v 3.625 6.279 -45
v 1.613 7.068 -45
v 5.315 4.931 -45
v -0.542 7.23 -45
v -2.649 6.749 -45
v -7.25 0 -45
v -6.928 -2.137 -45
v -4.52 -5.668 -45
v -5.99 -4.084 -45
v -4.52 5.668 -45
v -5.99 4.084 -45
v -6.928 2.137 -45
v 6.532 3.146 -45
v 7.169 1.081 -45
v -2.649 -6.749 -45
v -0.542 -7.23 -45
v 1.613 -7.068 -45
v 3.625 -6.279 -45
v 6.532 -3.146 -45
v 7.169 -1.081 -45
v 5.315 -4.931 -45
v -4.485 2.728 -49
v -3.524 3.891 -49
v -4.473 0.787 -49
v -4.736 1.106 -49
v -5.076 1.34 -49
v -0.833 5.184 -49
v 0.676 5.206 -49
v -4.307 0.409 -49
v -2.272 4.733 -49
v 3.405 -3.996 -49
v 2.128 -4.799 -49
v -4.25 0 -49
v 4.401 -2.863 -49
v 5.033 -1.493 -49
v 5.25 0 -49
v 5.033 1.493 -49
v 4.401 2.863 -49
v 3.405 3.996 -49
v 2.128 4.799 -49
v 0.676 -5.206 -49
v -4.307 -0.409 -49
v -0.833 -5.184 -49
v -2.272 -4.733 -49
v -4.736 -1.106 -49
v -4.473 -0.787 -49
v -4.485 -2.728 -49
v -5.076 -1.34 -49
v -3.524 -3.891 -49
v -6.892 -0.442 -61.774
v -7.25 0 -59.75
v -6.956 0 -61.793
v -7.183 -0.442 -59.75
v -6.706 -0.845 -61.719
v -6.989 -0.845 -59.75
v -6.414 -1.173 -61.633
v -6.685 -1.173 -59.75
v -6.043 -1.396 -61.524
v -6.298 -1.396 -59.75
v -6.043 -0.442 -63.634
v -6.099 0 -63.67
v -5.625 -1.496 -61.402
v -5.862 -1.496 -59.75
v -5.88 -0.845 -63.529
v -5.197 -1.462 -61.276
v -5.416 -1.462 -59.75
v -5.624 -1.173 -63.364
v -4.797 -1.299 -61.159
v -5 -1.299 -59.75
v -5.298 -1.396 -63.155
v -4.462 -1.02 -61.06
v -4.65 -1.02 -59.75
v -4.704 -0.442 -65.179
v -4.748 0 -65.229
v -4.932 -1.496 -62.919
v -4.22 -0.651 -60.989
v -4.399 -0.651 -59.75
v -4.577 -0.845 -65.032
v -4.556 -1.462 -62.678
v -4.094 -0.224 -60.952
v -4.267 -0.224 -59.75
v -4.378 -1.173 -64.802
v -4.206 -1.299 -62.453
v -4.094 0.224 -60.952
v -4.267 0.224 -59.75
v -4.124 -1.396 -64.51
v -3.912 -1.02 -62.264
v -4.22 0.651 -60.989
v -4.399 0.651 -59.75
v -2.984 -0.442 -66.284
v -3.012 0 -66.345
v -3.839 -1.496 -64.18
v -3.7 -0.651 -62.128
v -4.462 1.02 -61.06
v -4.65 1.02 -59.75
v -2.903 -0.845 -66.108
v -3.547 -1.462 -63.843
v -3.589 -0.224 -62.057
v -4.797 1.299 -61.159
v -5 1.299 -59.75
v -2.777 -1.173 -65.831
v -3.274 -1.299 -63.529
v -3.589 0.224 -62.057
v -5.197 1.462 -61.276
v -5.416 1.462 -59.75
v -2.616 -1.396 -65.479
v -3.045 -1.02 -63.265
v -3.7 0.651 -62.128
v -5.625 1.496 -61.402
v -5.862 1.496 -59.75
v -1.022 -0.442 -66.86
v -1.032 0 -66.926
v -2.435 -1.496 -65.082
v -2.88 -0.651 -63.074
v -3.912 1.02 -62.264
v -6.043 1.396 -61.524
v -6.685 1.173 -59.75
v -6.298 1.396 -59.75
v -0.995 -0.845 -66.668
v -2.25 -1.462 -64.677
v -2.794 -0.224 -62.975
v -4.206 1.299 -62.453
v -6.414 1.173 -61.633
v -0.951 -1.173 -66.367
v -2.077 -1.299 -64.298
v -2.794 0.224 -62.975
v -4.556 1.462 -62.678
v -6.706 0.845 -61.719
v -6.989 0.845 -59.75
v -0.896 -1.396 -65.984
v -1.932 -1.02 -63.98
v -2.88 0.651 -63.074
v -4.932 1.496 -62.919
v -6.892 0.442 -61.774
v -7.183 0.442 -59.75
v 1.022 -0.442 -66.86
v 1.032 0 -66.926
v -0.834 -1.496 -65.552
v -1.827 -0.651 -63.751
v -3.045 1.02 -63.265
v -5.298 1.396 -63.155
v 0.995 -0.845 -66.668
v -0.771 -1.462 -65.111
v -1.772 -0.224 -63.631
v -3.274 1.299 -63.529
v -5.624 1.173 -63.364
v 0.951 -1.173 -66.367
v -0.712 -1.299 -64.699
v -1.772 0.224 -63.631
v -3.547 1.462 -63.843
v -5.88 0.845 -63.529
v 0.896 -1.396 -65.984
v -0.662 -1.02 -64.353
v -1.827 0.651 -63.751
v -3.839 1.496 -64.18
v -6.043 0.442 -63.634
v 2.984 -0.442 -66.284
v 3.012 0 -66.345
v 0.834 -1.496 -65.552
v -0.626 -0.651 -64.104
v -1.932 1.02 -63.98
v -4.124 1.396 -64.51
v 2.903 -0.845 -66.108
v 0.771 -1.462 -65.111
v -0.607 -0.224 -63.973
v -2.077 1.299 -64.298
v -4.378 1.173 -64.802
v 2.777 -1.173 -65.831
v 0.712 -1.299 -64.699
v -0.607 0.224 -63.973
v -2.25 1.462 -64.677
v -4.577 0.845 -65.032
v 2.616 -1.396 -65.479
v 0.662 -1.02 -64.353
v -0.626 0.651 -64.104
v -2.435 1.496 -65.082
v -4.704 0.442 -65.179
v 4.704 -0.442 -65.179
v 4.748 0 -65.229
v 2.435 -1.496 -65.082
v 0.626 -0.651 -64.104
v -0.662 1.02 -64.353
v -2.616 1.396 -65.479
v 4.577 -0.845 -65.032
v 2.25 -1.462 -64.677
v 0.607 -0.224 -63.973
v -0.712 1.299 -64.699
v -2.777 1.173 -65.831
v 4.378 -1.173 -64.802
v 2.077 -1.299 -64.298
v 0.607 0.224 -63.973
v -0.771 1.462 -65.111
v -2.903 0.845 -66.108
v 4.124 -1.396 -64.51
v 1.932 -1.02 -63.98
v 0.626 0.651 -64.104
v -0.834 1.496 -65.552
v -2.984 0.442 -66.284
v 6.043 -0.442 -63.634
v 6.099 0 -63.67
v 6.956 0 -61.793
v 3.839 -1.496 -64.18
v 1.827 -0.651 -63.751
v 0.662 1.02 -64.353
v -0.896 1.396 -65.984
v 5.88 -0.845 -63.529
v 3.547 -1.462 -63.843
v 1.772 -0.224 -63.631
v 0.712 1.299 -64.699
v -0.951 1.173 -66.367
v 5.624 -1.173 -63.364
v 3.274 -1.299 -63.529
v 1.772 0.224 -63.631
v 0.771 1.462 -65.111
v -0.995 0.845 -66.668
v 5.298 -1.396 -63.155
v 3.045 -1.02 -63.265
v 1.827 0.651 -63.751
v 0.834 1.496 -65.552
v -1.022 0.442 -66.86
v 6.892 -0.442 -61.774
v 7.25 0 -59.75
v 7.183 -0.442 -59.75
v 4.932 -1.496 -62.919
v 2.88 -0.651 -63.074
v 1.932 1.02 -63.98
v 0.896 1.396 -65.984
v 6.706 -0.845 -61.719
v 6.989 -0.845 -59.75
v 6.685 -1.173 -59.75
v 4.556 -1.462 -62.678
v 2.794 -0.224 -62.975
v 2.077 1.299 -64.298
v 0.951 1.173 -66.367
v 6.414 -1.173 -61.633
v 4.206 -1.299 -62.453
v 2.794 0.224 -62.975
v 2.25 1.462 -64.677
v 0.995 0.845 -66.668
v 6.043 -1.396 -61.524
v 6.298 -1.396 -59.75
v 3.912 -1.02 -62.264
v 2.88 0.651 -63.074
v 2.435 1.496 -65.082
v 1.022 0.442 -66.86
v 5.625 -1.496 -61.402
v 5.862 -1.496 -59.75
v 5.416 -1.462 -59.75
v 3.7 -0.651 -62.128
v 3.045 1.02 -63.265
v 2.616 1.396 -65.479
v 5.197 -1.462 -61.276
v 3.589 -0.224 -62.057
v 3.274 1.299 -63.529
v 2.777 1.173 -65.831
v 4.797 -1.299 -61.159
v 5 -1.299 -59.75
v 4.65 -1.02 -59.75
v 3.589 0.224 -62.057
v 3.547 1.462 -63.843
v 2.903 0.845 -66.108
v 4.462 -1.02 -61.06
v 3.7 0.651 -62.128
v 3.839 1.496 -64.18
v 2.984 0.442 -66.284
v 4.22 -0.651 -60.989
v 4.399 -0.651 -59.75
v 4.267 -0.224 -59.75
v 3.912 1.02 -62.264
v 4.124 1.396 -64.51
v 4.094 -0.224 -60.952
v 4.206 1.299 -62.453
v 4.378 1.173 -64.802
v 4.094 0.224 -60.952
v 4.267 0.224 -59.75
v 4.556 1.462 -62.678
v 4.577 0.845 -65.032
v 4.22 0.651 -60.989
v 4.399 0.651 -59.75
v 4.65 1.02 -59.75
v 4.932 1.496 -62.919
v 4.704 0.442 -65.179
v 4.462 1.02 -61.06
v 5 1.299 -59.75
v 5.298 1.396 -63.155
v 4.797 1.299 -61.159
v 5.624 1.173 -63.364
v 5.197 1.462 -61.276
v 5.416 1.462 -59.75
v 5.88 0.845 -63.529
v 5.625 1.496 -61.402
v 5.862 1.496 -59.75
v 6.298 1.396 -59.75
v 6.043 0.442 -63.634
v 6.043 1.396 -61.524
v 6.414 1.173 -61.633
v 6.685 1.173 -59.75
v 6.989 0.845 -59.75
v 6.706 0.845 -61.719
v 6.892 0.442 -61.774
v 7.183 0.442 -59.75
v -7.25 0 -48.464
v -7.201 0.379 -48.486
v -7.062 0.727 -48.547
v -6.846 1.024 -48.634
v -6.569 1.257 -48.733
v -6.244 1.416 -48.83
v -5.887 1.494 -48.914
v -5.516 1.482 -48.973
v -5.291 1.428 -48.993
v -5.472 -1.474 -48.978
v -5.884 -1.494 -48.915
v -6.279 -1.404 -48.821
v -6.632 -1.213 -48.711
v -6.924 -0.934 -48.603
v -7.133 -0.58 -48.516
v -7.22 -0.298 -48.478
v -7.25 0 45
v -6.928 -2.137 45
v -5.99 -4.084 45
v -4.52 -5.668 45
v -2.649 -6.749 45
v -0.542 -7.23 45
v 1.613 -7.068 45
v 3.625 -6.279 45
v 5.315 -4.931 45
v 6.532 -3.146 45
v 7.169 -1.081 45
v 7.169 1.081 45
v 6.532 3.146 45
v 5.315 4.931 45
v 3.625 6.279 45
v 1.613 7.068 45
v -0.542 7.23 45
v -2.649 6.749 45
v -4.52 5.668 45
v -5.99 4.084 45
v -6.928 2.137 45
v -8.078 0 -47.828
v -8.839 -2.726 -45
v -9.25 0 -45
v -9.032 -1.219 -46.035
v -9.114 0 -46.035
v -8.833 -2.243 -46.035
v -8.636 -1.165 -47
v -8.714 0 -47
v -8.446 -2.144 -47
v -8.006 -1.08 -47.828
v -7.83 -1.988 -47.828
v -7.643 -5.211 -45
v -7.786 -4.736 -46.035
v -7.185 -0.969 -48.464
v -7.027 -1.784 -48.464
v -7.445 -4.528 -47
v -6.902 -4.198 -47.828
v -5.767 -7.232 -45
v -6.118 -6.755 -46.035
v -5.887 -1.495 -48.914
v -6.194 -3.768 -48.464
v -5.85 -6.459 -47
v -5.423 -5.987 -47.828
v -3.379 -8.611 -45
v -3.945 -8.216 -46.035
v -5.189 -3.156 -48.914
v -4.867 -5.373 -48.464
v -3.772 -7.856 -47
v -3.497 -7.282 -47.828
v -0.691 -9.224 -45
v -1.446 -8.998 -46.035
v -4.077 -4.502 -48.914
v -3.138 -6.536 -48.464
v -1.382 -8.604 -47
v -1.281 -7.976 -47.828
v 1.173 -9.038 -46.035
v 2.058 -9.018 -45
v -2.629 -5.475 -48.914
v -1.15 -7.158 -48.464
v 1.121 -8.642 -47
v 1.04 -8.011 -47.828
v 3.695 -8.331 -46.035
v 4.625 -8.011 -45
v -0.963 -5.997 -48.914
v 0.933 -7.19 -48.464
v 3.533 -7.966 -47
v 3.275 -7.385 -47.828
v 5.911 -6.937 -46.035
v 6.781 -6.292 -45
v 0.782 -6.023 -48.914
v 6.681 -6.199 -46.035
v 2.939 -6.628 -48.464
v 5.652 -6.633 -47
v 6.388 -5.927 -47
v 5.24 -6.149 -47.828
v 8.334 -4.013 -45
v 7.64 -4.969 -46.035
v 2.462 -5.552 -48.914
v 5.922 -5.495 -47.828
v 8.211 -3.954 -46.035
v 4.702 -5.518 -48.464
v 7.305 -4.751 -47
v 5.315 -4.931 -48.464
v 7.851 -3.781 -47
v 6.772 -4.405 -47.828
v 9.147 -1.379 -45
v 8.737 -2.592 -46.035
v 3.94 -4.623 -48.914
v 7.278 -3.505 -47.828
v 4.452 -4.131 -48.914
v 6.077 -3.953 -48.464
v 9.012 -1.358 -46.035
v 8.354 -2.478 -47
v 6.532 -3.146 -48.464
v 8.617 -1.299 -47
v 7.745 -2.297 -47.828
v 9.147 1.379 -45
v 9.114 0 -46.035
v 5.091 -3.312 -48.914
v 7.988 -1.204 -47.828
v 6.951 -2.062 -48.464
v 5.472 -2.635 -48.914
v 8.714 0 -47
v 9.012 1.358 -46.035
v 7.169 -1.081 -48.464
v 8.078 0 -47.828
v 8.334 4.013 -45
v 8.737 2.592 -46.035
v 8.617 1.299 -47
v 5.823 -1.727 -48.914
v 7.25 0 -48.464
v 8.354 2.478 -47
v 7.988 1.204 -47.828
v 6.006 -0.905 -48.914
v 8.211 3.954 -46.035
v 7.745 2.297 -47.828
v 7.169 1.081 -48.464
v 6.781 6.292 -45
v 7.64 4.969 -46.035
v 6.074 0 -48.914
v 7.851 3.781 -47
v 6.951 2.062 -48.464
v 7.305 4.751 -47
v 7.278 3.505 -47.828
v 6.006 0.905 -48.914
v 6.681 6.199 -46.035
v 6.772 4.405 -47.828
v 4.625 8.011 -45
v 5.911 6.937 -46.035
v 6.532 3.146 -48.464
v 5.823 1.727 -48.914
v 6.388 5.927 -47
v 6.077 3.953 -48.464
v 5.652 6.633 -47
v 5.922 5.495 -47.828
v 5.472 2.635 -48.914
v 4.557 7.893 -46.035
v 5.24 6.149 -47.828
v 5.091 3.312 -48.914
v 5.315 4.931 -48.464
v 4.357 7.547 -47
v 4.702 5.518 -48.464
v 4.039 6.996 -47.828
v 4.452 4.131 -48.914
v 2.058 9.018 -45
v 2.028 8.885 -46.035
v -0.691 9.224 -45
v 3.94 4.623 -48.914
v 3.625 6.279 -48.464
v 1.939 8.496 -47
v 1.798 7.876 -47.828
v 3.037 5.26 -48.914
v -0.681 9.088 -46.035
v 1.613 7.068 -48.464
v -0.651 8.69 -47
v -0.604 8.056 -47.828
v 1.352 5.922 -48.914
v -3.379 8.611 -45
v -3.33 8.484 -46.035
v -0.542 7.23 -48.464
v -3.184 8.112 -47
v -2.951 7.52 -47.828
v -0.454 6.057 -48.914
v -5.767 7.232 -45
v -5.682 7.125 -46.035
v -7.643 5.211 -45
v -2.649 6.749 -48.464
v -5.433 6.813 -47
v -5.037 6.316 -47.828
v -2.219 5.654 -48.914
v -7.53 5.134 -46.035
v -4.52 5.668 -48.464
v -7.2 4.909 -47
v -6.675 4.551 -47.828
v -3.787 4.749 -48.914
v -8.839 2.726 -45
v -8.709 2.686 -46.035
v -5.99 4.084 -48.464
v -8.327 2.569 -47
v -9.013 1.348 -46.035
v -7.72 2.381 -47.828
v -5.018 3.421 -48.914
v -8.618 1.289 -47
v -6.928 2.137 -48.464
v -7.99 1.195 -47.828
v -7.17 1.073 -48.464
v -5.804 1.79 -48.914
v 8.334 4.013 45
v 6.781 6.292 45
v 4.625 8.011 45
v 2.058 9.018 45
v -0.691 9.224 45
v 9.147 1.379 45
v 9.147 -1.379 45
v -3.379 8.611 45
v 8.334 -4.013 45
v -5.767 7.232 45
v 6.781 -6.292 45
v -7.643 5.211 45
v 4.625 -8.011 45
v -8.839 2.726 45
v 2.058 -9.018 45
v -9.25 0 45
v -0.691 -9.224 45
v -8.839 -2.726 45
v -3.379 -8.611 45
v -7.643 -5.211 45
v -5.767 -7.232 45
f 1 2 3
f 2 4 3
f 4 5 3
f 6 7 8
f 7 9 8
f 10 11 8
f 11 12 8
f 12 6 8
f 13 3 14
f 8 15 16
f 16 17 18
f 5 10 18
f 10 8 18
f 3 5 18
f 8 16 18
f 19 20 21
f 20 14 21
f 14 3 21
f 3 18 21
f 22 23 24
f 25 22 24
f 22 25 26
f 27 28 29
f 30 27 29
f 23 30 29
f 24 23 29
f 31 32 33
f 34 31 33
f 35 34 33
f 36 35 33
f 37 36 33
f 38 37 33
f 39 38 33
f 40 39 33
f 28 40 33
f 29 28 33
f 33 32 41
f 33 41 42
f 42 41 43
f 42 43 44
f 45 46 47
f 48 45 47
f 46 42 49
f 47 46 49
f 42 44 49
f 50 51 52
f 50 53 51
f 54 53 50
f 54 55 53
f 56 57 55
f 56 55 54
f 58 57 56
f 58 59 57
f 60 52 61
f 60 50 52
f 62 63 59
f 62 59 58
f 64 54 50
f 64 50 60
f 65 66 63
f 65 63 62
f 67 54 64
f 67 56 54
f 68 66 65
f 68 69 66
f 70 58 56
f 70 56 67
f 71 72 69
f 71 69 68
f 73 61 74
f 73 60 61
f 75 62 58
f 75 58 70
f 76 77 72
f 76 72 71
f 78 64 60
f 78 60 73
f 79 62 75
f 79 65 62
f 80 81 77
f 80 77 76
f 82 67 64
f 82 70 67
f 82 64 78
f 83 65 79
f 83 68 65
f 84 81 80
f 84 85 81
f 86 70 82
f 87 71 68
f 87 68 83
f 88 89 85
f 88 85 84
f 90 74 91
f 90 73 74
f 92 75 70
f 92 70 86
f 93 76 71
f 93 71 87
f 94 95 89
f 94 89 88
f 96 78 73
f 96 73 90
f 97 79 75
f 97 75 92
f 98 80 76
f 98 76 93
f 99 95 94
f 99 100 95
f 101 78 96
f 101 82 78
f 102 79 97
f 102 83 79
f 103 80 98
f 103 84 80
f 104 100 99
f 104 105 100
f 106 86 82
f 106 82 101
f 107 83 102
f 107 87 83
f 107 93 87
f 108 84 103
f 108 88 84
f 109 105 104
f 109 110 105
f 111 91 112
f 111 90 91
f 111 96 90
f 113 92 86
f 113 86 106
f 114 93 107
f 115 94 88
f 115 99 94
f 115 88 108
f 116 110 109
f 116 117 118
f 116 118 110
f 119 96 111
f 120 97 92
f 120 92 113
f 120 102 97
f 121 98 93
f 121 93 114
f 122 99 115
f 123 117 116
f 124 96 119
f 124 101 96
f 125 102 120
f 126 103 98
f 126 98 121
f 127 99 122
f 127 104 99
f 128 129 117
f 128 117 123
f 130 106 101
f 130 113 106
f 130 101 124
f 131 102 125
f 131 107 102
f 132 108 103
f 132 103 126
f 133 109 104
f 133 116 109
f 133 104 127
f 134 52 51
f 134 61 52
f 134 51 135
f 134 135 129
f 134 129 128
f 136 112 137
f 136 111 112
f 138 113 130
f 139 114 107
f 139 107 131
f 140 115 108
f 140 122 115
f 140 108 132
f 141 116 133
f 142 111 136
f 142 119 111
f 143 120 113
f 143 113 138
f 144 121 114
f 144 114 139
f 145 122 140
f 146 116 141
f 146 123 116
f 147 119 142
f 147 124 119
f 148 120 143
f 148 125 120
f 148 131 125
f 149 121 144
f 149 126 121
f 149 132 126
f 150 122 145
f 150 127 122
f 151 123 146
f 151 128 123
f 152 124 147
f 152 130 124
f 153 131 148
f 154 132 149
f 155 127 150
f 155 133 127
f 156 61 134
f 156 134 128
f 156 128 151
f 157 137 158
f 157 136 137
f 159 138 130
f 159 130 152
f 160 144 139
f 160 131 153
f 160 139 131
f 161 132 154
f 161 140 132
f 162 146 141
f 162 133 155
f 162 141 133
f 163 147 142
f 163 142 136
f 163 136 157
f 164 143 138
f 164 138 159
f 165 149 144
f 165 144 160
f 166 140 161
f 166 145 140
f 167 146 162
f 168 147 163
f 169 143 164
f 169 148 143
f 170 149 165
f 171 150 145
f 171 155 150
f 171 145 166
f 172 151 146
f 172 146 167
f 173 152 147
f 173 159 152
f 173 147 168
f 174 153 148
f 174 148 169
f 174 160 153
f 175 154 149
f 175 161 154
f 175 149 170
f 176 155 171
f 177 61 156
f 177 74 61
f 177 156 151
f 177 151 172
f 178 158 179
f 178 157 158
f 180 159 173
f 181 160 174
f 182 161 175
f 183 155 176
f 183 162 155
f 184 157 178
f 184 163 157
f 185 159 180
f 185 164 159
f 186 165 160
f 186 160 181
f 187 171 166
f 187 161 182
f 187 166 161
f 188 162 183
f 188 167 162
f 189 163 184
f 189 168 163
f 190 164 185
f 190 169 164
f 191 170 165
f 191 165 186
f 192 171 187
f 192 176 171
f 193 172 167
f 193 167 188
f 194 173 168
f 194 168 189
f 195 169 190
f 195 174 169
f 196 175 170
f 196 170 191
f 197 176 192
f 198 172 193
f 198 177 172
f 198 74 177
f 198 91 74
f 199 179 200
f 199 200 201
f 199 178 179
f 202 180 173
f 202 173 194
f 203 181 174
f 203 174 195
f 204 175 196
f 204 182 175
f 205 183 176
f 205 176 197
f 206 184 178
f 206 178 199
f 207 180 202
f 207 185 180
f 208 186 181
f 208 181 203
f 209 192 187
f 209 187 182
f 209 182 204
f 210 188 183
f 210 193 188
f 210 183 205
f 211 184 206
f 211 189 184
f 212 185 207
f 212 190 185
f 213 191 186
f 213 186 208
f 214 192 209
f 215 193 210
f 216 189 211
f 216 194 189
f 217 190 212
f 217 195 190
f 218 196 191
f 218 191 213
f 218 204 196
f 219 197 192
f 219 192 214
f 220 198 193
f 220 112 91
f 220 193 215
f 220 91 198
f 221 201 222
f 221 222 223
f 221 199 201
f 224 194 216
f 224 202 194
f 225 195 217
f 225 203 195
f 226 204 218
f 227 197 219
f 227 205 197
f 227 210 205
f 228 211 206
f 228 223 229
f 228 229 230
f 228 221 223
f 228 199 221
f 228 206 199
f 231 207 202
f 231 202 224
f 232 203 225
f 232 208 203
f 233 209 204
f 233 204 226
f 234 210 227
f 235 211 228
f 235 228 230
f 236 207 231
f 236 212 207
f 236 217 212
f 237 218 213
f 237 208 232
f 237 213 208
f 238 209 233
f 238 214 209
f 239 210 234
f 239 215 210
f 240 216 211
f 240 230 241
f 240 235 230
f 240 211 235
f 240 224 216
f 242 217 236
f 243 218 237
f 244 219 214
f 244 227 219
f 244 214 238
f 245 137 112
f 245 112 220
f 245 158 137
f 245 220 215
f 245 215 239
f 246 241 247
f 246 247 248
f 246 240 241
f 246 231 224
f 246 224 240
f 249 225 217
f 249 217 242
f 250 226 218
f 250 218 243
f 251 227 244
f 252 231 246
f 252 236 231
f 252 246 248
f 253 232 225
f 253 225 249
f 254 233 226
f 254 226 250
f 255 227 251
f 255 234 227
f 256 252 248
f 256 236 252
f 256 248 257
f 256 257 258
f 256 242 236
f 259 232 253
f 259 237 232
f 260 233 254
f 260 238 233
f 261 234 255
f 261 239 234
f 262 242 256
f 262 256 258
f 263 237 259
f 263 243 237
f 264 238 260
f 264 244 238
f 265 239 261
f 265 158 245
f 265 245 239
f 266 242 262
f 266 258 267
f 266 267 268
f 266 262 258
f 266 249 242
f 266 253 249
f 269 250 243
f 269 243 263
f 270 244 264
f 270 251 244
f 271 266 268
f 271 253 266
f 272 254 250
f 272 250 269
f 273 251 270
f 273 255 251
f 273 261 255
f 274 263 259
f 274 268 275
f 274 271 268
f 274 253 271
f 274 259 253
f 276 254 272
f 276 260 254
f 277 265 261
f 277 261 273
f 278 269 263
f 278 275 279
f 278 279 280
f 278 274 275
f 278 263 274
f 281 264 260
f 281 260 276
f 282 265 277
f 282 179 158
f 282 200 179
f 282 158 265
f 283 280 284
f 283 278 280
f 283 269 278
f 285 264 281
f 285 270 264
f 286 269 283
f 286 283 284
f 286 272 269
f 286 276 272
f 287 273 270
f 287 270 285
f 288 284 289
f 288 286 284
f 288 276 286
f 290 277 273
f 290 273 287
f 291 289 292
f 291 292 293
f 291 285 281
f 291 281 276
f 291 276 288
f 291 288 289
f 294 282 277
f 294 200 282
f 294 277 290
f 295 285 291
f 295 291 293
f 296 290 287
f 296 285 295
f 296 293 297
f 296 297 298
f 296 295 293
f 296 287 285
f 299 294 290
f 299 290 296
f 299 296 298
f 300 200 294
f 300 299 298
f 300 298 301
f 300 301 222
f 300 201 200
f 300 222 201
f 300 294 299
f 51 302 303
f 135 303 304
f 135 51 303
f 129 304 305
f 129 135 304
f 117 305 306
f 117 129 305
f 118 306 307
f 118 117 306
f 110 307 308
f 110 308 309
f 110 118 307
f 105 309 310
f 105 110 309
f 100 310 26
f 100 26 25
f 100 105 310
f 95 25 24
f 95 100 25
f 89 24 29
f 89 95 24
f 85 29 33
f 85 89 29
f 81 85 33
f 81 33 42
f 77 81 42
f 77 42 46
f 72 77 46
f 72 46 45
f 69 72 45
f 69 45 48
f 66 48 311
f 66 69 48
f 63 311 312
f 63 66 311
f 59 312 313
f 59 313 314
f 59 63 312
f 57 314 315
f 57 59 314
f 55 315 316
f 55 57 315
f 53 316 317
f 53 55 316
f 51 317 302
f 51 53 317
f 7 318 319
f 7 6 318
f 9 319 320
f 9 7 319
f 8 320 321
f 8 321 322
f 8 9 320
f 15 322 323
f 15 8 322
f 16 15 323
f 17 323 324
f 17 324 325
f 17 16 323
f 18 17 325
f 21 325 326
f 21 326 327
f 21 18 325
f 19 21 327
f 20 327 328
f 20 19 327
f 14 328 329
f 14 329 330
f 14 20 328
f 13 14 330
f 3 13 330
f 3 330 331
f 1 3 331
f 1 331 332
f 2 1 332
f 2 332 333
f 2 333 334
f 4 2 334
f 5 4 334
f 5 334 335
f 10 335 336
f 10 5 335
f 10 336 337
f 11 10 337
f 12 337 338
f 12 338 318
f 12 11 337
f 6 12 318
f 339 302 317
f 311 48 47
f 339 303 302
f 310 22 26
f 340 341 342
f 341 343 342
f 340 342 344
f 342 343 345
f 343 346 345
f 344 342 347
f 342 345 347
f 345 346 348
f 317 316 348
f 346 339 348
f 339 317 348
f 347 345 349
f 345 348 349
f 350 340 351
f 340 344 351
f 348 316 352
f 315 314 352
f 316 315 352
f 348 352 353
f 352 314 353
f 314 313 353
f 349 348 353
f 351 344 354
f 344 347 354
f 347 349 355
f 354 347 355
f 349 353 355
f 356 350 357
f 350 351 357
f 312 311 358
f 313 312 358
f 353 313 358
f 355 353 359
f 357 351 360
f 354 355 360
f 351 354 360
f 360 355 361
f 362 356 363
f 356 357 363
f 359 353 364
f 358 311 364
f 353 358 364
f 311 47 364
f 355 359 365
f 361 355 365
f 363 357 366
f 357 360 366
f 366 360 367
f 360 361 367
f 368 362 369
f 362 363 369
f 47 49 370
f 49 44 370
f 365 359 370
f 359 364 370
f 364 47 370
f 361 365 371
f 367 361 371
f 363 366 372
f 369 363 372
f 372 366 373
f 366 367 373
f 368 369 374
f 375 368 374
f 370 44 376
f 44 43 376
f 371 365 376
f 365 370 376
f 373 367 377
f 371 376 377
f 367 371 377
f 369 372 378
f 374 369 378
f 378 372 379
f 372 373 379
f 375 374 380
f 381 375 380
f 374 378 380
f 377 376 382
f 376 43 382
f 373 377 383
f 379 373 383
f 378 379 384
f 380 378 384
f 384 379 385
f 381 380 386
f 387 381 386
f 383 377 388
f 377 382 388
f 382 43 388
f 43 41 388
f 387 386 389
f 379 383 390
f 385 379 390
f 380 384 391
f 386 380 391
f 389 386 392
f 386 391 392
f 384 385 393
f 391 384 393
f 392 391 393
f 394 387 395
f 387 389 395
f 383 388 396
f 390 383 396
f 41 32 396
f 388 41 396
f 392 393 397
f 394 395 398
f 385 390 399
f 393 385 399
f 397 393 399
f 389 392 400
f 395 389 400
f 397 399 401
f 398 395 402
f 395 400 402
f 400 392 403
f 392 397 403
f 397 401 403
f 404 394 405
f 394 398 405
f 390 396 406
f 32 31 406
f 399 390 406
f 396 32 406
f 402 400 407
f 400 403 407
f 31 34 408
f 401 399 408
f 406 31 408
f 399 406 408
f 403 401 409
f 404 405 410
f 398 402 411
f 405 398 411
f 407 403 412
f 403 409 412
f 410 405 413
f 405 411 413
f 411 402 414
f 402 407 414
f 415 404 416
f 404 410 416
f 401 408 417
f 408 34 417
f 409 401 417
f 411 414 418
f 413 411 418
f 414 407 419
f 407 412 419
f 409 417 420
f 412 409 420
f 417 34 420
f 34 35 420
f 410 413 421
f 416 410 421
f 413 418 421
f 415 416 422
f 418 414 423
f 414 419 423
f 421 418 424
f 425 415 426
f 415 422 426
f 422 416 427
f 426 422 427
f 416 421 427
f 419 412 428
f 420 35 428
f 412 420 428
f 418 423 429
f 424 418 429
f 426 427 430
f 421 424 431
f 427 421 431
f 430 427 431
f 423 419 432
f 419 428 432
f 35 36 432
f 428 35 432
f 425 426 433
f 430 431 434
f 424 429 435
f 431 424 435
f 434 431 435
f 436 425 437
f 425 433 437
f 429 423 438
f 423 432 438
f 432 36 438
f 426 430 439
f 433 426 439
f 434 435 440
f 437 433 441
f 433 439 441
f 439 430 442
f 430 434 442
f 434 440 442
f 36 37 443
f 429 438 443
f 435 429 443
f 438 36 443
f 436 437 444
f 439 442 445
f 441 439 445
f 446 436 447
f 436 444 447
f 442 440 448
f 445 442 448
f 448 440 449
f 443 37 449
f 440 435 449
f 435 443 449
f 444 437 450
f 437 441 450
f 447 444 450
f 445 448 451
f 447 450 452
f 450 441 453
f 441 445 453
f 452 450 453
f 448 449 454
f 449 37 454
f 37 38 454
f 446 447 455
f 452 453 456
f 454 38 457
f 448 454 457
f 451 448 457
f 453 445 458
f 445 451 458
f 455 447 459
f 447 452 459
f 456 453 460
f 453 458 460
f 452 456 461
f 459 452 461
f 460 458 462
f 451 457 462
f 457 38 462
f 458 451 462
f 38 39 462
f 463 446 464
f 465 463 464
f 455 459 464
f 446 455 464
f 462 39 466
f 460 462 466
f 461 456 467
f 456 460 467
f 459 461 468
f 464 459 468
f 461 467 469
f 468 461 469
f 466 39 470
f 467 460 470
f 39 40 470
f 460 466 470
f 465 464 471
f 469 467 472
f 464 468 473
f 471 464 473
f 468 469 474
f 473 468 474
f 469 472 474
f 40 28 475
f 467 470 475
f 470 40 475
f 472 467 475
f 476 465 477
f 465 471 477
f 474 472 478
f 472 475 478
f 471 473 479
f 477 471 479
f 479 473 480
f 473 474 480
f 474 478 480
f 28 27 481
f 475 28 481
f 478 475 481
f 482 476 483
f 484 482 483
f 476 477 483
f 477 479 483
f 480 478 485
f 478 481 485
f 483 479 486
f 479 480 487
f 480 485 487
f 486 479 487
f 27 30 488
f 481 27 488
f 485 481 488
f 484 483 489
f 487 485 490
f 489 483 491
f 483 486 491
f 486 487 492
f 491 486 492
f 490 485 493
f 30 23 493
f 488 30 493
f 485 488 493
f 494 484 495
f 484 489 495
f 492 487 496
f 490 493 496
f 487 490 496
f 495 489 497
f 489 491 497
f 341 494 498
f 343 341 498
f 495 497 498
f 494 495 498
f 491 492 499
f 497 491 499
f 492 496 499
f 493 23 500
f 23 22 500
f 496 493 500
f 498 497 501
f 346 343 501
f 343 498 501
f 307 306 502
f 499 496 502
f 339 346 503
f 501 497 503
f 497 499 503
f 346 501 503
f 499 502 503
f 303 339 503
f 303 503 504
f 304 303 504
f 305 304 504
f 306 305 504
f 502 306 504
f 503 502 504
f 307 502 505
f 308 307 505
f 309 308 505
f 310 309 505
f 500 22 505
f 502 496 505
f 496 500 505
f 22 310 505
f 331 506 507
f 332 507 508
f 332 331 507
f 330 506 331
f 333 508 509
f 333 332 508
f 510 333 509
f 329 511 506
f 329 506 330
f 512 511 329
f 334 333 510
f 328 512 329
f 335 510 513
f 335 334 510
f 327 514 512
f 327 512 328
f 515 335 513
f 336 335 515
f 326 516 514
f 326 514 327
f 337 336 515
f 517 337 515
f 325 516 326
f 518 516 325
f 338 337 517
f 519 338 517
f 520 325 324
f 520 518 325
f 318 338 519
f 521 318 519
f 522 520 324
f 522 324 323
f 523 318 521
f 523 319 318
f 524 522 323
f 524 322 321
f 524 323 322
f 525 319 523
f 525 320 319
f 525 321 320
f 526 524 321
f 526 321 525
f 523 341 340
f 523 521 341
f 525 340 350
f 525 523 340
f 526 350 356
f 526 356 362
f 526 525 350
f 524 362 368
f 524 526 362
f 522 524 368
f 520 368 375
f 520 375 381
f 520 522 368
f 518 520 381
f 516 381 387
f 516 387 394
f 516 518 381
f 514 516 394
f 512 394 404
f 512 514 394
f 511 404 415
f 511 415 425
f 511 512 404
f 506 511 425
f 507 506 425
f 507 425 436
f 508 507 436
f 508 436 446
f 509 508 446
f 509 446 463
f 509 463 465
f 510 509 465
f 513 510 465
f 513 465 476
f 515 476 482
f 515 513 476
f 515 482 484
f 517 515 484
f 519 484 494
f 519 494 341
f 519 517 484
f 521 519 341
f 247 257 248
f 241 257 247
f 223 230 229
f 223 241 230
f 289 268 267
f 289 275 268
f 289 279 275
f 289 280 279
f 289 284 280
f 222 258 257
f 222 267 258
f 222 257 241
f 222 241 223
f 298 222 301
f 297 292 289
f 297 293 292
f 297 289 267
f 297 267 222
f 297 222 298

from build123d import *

# Parameters (mm, degrees)
ESQUISSE2_R        = 9.25
ESQUISSE2_R_2      = 7.25
BOSS_EXTRU_1_DEPTH = 45
ESQUISSE5_R        = 1.5


with BuildPart() as part:
    # Esquisse2 → Boss.-Extru.1 (new, symmetric)
    with BuildSketch(Plane.XY):
        with Locations(Location((0, 0, 0), (0, 0, 180))):
            Circle(ESQUISSE2_R)
        with Locations(Location((0, 0, 0), (0, 0, 180))):
            Circle(ESQUISSE2_R_2, mode=Mode.SUBTRACT)
    extrude(amount=BOSS_EXTRU_1_DEPTH, both=True)

    # Esquisse3 → Révolution1 (revolve)
    with BuildSketch(Plane(origin=(0, 0, 0), x_dir=(1, 0, 0), z_dir=(0, 1, 0))):
        with BuildLine():
            Line((-5.25, 49), (0, 49))
            Line((0, 49), (0, 45))
            Line((0, 45), (-9.25, 45))
            ThreePointArc((-9.25, 45), (-8.078427125, 47.828427125), (-5.25, 49))
        make_face()
    revolve(axis=Axis((0, 0, -49), (0, 0, 1)))

    # Balayage3: sweep along a path in Esquisse6
    with BuildLine(Plane(origin=(0, 0, 0), x_dir=(1, 0, 0), z_dir=(0, 1, 0))) as balayage3_path:
        Line((-4.25, 45), (-4.25, 59.75))
        ThreePointArc((-4.25, 59.75), (0, 64), (4.25, 59.75))
    # Esquisse5 → Balayage3 (sweep)
    with BuildSketch(Plane(origin=(0, 0, 0), x_dir=(0, 0, -1), z_dir=(1, 0, 0))):
        with Locations((65.5, 0)):
            Circle(ESQUISSE5_R)
    sweep(path=balayage3_path.line)


solid = part.part
